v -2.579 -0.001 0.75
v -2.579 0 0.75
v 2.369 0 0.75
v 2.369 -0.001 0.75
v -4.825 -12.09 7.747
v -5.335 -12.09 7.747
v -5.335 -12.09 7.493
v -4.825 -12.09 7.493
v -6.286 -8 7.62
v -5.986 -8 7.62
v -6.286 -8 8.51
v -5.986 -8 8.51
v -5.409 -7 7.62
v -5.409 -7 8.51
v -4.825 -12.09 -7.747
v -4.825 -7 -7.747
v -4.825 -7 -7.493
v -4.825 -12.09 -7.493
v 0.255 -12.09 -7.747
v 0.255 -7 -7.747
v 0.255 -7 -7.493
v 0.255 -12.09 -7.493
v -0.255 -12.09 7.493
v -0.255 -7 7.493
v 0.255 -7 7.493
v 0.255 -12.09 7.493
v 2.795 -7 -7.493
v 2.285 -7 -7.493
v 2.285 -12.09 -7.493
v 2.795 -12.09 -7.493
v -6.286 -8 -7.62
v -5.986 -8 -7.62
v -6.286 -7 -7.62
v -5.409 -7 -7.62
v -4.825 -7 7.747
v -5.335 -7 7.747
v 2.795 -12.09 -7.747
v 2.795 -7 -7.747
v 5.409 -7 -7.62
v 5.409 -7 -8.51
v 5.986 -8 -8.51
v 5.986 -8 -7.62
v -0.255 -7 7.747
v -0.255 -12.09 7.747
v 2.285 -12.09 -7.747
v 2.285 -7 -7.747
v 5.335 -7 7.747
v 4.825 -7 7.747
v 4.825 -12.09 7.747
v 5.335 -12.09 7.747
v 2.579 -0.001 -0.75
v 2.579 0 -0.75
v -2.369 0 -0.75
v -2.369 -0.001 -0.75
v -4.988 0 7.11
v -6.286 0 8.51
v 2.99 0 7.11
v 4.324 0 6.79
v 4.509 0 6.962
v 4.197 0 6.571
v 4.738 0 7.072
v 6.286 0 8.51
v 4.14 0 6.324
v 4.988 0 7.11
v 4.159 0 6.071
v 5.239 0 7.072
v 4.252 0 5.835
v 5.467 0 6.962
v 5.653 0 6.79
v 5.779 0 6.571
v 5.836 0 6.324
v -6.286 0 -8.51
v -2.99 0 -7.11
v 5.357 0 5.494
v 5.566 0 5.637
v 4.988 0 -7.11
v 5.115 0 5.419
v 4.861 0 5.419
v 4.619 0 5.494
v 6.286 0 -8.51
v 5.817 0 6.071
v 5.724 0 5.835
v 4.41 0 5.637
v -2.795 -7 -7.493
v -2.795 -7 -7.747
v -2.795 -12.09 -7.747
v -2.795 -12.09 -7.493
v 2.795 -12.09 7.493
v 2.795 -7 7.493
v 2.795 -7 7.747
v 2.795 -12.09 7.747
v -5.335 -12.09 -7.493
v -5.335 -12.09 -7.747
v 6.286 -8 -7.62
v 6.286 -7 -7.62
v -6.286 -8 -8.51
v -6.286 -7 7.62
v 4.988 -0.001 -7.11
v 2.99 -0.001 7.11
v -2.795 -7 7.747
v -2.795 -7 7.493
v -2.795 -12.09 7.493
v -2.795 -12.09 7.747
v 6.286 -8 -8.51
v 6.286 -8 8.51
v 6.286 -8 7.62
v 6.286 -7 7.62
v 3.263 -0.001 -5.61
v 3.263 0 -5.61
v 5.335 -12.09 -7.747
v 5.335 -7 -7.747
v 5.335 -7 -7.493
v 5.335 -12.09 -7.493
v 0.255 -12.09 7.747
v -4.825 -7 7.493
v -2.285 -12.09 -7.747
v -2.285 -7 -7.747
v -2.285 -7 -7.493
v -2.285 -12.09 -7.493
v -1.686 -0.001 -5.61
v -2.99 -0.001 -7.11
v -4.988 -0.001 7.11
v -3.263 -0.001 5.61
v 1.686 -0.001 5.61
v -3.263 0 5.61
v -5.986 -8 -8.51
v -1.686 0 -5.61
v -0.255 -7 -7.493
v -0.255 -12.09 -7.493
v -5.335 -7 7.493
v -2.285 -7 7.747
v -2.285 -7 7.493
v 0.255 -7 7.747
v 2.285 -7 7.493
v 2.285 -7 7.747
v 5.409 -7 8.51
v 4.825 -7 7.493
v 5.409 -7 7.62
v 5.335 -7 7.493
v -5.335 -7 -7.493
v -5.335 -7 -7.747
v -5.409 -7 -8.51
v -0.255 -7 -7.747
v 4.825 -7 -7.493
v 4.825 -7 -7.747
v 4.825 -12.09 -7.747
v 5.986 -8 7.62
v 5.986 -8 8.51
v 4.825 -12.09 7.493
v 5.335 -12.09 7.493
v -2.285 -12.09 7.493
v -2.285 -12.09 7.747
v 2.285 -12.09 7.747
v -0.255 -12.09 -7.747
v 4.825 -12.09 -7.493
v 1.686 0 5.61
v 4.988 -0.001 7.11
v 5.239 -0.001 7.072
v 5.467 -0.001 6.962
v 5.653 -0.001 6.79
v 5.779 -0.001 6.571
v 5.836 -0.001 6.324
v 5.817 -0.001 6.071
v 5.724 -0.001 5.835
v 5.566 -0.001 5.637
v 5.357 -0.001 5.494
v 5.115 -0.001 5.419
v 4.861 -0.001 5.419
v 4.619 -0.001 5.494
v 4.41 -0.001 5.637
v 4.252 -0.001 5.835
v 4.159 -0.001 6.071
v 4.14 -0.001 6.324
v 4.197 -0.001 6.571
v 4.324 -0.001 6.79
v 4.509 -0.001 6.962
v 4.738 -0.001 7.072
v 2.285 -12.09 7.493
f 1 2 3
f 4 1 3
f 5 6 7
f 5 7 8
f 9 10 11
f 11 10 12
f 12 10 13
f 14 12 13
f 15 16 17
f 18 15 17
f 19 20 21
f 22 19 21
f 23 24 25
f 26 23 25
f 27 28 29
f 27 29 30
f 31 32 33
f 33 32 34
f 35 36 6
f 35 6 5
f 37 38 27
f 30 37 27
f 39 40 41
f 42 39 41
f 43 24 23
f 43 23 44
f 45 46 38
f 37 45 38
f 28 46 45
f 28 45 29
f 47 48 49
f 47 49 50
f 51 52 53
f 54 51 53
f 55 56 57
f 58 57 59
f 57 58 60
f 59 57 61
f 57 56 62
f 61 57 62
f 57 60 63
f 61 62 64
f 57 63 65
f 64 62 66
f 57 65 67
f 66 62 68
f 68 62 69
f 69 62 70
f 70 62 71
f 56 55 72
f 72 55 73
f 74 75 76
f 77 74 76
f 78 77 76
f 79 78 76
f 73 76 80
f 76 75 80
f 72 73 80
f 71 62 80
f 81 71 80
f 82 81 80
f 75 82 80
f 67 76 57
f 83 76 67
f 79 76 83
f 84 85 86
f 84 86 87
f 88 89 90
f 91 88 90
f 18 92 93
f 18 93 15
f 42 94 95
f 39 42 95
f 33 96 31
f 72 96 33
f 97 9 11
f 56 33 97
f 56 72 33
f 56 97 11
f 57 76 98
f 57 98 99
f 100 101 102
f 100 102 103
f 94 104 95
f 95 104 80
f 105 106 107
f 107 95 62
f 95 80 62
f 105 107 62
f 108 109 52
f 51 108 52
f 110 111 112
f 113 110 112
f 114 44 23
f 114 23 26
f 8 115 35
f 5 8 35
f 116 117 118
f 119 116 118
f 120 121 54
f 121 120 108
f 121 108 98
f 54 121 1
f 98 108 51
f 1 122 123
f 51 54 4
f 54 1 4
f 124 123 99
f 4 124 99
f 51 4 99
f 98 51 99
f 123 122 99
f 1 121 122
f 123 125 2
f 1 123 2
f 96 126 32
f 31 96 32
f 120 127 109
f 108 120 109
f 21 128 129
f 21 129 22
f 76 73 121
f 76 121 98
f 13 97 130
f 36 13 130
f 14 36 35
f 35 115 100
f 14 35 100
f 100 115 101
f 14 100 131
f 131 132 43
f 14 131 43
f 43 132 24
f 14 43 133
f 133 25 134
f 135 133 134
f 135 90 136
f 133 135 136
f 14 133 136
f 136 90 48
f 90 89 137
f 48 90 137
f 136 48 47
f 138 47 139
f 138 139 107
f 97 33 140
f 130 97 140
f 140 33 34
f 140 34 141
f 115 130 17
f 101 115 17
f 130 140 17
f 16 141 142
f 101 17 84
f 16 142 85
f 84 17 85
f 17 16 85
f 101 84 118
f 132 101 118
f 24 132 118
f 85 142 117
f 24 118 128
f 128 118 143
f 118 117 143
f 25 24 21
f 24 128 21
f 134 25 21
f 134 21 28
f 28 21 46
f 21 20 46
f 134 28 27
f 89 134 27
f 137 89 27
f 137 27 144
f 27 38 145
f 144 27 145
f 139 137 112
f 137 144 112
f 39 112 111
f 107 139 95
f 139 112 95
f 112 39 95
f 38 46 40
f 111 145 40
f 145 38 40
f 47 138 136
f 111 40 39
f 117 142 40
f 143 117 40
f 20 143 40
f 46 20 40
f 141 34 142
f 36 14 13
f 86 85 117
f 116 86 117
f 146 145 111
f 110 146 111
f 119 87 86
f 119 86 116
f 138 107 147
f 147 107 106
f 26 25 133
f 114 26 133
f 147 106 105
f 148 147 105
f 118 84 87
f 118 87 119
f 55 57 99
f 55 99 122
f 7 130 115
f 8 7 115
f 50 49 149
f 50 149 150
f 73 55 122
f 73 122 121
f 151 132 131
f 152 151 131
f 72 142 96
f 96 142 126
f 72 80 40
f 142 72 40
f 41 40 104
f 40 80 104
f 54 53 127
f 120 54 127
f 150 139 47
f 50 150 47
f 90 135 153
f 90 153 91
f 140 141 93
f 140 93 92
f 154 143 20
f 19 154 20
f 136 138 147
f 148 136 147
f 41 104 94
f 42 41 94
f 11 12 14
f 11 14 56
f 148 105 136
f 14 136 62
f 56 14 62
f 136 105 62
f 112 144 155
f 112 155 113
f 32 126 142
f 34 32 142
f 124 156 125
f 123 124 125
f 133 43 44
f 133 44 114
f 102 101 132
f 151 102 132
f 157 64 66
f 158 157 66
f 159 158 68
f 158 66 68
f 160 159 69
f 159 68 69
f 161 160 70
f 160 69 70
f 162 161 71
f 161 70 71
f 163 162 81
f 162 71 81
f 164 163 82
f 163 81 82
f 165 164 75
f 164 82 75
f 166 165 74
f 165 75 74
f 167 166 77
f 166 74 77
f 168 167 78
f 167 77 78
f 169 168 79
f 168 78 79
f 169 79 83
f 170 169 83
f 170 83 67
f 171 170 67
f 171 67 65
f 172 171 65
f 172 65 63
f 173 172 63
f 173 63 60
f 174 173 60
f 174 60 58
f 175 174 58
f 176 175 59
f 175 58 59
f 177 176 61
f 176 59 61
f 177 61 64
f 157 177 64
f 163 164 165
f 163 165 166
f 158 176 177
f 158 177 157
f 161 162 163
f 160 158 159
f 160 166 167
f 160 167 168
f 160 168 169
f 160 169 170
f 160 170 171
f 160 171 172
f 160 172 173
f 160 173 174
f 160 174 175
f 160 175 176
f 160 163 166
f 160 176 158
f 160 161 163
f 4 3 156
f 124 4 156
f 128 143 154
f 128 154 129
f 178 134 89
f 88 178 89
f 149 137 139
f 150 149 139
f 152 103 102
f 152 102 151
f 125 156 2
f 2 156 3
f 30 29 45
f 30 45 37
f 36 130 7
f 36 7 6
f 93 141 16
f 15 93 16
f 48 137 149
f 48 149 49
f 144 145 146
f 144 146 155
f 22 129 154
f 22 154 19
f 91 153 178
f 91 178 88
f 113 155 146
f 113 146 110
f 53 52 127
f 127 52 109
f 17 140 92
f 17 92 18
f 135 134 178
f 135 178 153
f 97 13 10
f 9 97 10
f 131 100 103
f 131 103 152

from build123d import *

# Parameters (mm, degrees)
EXTRUDE1_DEPTH          = 6.2865
SKETCH4_R               = 0.85
CUT_EXTRUDE1_DEPTH      = 0.001
CUT_EXTRUDE2_DEPTH      = 14.264244504
CUT_EXTRUDE2_DEPTH_BACK = 14.264244504
SKETCH2_W               = 0.51
SKETCH2_H               = 0.254
EXTRUDE2_DEPTH          = 5.09
LPATTERN1_COUNT         = 3
LPATTERN1_PITCH         = 2.54
LPATTERN1_COL_COUNT     = 3
LPATTERN1_COL_PITCH     = 2.54


with BuildPart() as part:
    # Sketch1 → Extrude1 (new, symmetric)
    with BuildSketch(Plane(origin=(0, 0, 0), x_dir=(0, 0, -1), z_dir=(1, 0, 0))):
        Polygon((-8.51, 0), (8.51, 0), (8.51, -8), (7.62, -8), (7.62, -7), (-7.62, -7), (-7.62, -8), (-8.51, -8), align=None)
    extrude(amount=EXTRUDE1_DEPTH, both=True)

    # Sketch4 → Cut-Extrude1 (cut)
    # profile 1 of 2: a face of its own
    with BuildSketch(Plane(origin=(0, 0, 0), x_dir=(-1, 0, 0), z_dir=(0, 1, 0))):
        with Locations(Location((-4.988064246, 6.26, 0), (0, 0, 90))):
            Circle(SKETCH4_R)
    # profile 2 of 2: a face of its own
    with BuildSketch(Plane(origin=(0, 0, 0), x_dir=(-1, 0, 0), z_dir=(0, 1, 0))):
        Polygon((4.988064246, 7.11), (2.989573577, -7.11), (-4.988064246, -7.11), (-2.989573577, 7.11), align=None)
        Polygon((-1.68564347, 5.61), (3.262511635, 5.61), (2.579483179, 0.75), (-2.368671927, 0.75), align=None, mode=Mode.SUBTRACT)
        Polygon((-3.262511635, -5.61), (-2.579483179, -0.75), (2.368671927, -0.75), (1.68564347, -5.61), align=None, mode=Mode.SUBTRACT)
    extrude(amount=-CUT_EXTRUDE1_DEPTH, mode=Mode.SUBTRACT)

    # Sketch5 → Cut-Extrude2 (cut, two sides: drawn at the far end of the back side and taken through both)
    with BuildSketch(Plane.XY.offset(-CUT_EXTRUDE2_DEPTH_BACK)):
        Polygon((-5.9865, -8), (-5.409149731, -7), (5.409149731, -7), (5.9865, -8), align=None)
    extrude(amount=CUT_EXTRUDE2_DEPTH + CUT_EXTRUDE2_DEPTH_BACK, mode=Mode.SUBTRACT)

    # Sketch2 → Extrude2 (add)
    with BuildSketch(Plane.XZ.offset(7)):
        with Locations((0, 7.62)):
            Rectangle(SKETCH2_W, SKETCH2_H)
        with Locations((0, -7.62)):
            Rectangle(SKETCH2_W, SKETCH2_H)
    extrude2 = extrude(amount=EXTRUDE2_DEPTH)

    # LPattern1: Extrude2 ×3
    with Locations(*[(i * LPATTERN1_PITCH, 0, 0) for i in range(1, LPATTERN1_COUNT)]):
        add(extrude2)

    # LPattern1 col: Extrude2 ×3
    with Locations(*[(-i * LPATTERN1_COL_PITCH, 0, 0) for i in range(1, LPATTERN1_COL_COUNT)]):
        add(extrude2)


solid = part.part
